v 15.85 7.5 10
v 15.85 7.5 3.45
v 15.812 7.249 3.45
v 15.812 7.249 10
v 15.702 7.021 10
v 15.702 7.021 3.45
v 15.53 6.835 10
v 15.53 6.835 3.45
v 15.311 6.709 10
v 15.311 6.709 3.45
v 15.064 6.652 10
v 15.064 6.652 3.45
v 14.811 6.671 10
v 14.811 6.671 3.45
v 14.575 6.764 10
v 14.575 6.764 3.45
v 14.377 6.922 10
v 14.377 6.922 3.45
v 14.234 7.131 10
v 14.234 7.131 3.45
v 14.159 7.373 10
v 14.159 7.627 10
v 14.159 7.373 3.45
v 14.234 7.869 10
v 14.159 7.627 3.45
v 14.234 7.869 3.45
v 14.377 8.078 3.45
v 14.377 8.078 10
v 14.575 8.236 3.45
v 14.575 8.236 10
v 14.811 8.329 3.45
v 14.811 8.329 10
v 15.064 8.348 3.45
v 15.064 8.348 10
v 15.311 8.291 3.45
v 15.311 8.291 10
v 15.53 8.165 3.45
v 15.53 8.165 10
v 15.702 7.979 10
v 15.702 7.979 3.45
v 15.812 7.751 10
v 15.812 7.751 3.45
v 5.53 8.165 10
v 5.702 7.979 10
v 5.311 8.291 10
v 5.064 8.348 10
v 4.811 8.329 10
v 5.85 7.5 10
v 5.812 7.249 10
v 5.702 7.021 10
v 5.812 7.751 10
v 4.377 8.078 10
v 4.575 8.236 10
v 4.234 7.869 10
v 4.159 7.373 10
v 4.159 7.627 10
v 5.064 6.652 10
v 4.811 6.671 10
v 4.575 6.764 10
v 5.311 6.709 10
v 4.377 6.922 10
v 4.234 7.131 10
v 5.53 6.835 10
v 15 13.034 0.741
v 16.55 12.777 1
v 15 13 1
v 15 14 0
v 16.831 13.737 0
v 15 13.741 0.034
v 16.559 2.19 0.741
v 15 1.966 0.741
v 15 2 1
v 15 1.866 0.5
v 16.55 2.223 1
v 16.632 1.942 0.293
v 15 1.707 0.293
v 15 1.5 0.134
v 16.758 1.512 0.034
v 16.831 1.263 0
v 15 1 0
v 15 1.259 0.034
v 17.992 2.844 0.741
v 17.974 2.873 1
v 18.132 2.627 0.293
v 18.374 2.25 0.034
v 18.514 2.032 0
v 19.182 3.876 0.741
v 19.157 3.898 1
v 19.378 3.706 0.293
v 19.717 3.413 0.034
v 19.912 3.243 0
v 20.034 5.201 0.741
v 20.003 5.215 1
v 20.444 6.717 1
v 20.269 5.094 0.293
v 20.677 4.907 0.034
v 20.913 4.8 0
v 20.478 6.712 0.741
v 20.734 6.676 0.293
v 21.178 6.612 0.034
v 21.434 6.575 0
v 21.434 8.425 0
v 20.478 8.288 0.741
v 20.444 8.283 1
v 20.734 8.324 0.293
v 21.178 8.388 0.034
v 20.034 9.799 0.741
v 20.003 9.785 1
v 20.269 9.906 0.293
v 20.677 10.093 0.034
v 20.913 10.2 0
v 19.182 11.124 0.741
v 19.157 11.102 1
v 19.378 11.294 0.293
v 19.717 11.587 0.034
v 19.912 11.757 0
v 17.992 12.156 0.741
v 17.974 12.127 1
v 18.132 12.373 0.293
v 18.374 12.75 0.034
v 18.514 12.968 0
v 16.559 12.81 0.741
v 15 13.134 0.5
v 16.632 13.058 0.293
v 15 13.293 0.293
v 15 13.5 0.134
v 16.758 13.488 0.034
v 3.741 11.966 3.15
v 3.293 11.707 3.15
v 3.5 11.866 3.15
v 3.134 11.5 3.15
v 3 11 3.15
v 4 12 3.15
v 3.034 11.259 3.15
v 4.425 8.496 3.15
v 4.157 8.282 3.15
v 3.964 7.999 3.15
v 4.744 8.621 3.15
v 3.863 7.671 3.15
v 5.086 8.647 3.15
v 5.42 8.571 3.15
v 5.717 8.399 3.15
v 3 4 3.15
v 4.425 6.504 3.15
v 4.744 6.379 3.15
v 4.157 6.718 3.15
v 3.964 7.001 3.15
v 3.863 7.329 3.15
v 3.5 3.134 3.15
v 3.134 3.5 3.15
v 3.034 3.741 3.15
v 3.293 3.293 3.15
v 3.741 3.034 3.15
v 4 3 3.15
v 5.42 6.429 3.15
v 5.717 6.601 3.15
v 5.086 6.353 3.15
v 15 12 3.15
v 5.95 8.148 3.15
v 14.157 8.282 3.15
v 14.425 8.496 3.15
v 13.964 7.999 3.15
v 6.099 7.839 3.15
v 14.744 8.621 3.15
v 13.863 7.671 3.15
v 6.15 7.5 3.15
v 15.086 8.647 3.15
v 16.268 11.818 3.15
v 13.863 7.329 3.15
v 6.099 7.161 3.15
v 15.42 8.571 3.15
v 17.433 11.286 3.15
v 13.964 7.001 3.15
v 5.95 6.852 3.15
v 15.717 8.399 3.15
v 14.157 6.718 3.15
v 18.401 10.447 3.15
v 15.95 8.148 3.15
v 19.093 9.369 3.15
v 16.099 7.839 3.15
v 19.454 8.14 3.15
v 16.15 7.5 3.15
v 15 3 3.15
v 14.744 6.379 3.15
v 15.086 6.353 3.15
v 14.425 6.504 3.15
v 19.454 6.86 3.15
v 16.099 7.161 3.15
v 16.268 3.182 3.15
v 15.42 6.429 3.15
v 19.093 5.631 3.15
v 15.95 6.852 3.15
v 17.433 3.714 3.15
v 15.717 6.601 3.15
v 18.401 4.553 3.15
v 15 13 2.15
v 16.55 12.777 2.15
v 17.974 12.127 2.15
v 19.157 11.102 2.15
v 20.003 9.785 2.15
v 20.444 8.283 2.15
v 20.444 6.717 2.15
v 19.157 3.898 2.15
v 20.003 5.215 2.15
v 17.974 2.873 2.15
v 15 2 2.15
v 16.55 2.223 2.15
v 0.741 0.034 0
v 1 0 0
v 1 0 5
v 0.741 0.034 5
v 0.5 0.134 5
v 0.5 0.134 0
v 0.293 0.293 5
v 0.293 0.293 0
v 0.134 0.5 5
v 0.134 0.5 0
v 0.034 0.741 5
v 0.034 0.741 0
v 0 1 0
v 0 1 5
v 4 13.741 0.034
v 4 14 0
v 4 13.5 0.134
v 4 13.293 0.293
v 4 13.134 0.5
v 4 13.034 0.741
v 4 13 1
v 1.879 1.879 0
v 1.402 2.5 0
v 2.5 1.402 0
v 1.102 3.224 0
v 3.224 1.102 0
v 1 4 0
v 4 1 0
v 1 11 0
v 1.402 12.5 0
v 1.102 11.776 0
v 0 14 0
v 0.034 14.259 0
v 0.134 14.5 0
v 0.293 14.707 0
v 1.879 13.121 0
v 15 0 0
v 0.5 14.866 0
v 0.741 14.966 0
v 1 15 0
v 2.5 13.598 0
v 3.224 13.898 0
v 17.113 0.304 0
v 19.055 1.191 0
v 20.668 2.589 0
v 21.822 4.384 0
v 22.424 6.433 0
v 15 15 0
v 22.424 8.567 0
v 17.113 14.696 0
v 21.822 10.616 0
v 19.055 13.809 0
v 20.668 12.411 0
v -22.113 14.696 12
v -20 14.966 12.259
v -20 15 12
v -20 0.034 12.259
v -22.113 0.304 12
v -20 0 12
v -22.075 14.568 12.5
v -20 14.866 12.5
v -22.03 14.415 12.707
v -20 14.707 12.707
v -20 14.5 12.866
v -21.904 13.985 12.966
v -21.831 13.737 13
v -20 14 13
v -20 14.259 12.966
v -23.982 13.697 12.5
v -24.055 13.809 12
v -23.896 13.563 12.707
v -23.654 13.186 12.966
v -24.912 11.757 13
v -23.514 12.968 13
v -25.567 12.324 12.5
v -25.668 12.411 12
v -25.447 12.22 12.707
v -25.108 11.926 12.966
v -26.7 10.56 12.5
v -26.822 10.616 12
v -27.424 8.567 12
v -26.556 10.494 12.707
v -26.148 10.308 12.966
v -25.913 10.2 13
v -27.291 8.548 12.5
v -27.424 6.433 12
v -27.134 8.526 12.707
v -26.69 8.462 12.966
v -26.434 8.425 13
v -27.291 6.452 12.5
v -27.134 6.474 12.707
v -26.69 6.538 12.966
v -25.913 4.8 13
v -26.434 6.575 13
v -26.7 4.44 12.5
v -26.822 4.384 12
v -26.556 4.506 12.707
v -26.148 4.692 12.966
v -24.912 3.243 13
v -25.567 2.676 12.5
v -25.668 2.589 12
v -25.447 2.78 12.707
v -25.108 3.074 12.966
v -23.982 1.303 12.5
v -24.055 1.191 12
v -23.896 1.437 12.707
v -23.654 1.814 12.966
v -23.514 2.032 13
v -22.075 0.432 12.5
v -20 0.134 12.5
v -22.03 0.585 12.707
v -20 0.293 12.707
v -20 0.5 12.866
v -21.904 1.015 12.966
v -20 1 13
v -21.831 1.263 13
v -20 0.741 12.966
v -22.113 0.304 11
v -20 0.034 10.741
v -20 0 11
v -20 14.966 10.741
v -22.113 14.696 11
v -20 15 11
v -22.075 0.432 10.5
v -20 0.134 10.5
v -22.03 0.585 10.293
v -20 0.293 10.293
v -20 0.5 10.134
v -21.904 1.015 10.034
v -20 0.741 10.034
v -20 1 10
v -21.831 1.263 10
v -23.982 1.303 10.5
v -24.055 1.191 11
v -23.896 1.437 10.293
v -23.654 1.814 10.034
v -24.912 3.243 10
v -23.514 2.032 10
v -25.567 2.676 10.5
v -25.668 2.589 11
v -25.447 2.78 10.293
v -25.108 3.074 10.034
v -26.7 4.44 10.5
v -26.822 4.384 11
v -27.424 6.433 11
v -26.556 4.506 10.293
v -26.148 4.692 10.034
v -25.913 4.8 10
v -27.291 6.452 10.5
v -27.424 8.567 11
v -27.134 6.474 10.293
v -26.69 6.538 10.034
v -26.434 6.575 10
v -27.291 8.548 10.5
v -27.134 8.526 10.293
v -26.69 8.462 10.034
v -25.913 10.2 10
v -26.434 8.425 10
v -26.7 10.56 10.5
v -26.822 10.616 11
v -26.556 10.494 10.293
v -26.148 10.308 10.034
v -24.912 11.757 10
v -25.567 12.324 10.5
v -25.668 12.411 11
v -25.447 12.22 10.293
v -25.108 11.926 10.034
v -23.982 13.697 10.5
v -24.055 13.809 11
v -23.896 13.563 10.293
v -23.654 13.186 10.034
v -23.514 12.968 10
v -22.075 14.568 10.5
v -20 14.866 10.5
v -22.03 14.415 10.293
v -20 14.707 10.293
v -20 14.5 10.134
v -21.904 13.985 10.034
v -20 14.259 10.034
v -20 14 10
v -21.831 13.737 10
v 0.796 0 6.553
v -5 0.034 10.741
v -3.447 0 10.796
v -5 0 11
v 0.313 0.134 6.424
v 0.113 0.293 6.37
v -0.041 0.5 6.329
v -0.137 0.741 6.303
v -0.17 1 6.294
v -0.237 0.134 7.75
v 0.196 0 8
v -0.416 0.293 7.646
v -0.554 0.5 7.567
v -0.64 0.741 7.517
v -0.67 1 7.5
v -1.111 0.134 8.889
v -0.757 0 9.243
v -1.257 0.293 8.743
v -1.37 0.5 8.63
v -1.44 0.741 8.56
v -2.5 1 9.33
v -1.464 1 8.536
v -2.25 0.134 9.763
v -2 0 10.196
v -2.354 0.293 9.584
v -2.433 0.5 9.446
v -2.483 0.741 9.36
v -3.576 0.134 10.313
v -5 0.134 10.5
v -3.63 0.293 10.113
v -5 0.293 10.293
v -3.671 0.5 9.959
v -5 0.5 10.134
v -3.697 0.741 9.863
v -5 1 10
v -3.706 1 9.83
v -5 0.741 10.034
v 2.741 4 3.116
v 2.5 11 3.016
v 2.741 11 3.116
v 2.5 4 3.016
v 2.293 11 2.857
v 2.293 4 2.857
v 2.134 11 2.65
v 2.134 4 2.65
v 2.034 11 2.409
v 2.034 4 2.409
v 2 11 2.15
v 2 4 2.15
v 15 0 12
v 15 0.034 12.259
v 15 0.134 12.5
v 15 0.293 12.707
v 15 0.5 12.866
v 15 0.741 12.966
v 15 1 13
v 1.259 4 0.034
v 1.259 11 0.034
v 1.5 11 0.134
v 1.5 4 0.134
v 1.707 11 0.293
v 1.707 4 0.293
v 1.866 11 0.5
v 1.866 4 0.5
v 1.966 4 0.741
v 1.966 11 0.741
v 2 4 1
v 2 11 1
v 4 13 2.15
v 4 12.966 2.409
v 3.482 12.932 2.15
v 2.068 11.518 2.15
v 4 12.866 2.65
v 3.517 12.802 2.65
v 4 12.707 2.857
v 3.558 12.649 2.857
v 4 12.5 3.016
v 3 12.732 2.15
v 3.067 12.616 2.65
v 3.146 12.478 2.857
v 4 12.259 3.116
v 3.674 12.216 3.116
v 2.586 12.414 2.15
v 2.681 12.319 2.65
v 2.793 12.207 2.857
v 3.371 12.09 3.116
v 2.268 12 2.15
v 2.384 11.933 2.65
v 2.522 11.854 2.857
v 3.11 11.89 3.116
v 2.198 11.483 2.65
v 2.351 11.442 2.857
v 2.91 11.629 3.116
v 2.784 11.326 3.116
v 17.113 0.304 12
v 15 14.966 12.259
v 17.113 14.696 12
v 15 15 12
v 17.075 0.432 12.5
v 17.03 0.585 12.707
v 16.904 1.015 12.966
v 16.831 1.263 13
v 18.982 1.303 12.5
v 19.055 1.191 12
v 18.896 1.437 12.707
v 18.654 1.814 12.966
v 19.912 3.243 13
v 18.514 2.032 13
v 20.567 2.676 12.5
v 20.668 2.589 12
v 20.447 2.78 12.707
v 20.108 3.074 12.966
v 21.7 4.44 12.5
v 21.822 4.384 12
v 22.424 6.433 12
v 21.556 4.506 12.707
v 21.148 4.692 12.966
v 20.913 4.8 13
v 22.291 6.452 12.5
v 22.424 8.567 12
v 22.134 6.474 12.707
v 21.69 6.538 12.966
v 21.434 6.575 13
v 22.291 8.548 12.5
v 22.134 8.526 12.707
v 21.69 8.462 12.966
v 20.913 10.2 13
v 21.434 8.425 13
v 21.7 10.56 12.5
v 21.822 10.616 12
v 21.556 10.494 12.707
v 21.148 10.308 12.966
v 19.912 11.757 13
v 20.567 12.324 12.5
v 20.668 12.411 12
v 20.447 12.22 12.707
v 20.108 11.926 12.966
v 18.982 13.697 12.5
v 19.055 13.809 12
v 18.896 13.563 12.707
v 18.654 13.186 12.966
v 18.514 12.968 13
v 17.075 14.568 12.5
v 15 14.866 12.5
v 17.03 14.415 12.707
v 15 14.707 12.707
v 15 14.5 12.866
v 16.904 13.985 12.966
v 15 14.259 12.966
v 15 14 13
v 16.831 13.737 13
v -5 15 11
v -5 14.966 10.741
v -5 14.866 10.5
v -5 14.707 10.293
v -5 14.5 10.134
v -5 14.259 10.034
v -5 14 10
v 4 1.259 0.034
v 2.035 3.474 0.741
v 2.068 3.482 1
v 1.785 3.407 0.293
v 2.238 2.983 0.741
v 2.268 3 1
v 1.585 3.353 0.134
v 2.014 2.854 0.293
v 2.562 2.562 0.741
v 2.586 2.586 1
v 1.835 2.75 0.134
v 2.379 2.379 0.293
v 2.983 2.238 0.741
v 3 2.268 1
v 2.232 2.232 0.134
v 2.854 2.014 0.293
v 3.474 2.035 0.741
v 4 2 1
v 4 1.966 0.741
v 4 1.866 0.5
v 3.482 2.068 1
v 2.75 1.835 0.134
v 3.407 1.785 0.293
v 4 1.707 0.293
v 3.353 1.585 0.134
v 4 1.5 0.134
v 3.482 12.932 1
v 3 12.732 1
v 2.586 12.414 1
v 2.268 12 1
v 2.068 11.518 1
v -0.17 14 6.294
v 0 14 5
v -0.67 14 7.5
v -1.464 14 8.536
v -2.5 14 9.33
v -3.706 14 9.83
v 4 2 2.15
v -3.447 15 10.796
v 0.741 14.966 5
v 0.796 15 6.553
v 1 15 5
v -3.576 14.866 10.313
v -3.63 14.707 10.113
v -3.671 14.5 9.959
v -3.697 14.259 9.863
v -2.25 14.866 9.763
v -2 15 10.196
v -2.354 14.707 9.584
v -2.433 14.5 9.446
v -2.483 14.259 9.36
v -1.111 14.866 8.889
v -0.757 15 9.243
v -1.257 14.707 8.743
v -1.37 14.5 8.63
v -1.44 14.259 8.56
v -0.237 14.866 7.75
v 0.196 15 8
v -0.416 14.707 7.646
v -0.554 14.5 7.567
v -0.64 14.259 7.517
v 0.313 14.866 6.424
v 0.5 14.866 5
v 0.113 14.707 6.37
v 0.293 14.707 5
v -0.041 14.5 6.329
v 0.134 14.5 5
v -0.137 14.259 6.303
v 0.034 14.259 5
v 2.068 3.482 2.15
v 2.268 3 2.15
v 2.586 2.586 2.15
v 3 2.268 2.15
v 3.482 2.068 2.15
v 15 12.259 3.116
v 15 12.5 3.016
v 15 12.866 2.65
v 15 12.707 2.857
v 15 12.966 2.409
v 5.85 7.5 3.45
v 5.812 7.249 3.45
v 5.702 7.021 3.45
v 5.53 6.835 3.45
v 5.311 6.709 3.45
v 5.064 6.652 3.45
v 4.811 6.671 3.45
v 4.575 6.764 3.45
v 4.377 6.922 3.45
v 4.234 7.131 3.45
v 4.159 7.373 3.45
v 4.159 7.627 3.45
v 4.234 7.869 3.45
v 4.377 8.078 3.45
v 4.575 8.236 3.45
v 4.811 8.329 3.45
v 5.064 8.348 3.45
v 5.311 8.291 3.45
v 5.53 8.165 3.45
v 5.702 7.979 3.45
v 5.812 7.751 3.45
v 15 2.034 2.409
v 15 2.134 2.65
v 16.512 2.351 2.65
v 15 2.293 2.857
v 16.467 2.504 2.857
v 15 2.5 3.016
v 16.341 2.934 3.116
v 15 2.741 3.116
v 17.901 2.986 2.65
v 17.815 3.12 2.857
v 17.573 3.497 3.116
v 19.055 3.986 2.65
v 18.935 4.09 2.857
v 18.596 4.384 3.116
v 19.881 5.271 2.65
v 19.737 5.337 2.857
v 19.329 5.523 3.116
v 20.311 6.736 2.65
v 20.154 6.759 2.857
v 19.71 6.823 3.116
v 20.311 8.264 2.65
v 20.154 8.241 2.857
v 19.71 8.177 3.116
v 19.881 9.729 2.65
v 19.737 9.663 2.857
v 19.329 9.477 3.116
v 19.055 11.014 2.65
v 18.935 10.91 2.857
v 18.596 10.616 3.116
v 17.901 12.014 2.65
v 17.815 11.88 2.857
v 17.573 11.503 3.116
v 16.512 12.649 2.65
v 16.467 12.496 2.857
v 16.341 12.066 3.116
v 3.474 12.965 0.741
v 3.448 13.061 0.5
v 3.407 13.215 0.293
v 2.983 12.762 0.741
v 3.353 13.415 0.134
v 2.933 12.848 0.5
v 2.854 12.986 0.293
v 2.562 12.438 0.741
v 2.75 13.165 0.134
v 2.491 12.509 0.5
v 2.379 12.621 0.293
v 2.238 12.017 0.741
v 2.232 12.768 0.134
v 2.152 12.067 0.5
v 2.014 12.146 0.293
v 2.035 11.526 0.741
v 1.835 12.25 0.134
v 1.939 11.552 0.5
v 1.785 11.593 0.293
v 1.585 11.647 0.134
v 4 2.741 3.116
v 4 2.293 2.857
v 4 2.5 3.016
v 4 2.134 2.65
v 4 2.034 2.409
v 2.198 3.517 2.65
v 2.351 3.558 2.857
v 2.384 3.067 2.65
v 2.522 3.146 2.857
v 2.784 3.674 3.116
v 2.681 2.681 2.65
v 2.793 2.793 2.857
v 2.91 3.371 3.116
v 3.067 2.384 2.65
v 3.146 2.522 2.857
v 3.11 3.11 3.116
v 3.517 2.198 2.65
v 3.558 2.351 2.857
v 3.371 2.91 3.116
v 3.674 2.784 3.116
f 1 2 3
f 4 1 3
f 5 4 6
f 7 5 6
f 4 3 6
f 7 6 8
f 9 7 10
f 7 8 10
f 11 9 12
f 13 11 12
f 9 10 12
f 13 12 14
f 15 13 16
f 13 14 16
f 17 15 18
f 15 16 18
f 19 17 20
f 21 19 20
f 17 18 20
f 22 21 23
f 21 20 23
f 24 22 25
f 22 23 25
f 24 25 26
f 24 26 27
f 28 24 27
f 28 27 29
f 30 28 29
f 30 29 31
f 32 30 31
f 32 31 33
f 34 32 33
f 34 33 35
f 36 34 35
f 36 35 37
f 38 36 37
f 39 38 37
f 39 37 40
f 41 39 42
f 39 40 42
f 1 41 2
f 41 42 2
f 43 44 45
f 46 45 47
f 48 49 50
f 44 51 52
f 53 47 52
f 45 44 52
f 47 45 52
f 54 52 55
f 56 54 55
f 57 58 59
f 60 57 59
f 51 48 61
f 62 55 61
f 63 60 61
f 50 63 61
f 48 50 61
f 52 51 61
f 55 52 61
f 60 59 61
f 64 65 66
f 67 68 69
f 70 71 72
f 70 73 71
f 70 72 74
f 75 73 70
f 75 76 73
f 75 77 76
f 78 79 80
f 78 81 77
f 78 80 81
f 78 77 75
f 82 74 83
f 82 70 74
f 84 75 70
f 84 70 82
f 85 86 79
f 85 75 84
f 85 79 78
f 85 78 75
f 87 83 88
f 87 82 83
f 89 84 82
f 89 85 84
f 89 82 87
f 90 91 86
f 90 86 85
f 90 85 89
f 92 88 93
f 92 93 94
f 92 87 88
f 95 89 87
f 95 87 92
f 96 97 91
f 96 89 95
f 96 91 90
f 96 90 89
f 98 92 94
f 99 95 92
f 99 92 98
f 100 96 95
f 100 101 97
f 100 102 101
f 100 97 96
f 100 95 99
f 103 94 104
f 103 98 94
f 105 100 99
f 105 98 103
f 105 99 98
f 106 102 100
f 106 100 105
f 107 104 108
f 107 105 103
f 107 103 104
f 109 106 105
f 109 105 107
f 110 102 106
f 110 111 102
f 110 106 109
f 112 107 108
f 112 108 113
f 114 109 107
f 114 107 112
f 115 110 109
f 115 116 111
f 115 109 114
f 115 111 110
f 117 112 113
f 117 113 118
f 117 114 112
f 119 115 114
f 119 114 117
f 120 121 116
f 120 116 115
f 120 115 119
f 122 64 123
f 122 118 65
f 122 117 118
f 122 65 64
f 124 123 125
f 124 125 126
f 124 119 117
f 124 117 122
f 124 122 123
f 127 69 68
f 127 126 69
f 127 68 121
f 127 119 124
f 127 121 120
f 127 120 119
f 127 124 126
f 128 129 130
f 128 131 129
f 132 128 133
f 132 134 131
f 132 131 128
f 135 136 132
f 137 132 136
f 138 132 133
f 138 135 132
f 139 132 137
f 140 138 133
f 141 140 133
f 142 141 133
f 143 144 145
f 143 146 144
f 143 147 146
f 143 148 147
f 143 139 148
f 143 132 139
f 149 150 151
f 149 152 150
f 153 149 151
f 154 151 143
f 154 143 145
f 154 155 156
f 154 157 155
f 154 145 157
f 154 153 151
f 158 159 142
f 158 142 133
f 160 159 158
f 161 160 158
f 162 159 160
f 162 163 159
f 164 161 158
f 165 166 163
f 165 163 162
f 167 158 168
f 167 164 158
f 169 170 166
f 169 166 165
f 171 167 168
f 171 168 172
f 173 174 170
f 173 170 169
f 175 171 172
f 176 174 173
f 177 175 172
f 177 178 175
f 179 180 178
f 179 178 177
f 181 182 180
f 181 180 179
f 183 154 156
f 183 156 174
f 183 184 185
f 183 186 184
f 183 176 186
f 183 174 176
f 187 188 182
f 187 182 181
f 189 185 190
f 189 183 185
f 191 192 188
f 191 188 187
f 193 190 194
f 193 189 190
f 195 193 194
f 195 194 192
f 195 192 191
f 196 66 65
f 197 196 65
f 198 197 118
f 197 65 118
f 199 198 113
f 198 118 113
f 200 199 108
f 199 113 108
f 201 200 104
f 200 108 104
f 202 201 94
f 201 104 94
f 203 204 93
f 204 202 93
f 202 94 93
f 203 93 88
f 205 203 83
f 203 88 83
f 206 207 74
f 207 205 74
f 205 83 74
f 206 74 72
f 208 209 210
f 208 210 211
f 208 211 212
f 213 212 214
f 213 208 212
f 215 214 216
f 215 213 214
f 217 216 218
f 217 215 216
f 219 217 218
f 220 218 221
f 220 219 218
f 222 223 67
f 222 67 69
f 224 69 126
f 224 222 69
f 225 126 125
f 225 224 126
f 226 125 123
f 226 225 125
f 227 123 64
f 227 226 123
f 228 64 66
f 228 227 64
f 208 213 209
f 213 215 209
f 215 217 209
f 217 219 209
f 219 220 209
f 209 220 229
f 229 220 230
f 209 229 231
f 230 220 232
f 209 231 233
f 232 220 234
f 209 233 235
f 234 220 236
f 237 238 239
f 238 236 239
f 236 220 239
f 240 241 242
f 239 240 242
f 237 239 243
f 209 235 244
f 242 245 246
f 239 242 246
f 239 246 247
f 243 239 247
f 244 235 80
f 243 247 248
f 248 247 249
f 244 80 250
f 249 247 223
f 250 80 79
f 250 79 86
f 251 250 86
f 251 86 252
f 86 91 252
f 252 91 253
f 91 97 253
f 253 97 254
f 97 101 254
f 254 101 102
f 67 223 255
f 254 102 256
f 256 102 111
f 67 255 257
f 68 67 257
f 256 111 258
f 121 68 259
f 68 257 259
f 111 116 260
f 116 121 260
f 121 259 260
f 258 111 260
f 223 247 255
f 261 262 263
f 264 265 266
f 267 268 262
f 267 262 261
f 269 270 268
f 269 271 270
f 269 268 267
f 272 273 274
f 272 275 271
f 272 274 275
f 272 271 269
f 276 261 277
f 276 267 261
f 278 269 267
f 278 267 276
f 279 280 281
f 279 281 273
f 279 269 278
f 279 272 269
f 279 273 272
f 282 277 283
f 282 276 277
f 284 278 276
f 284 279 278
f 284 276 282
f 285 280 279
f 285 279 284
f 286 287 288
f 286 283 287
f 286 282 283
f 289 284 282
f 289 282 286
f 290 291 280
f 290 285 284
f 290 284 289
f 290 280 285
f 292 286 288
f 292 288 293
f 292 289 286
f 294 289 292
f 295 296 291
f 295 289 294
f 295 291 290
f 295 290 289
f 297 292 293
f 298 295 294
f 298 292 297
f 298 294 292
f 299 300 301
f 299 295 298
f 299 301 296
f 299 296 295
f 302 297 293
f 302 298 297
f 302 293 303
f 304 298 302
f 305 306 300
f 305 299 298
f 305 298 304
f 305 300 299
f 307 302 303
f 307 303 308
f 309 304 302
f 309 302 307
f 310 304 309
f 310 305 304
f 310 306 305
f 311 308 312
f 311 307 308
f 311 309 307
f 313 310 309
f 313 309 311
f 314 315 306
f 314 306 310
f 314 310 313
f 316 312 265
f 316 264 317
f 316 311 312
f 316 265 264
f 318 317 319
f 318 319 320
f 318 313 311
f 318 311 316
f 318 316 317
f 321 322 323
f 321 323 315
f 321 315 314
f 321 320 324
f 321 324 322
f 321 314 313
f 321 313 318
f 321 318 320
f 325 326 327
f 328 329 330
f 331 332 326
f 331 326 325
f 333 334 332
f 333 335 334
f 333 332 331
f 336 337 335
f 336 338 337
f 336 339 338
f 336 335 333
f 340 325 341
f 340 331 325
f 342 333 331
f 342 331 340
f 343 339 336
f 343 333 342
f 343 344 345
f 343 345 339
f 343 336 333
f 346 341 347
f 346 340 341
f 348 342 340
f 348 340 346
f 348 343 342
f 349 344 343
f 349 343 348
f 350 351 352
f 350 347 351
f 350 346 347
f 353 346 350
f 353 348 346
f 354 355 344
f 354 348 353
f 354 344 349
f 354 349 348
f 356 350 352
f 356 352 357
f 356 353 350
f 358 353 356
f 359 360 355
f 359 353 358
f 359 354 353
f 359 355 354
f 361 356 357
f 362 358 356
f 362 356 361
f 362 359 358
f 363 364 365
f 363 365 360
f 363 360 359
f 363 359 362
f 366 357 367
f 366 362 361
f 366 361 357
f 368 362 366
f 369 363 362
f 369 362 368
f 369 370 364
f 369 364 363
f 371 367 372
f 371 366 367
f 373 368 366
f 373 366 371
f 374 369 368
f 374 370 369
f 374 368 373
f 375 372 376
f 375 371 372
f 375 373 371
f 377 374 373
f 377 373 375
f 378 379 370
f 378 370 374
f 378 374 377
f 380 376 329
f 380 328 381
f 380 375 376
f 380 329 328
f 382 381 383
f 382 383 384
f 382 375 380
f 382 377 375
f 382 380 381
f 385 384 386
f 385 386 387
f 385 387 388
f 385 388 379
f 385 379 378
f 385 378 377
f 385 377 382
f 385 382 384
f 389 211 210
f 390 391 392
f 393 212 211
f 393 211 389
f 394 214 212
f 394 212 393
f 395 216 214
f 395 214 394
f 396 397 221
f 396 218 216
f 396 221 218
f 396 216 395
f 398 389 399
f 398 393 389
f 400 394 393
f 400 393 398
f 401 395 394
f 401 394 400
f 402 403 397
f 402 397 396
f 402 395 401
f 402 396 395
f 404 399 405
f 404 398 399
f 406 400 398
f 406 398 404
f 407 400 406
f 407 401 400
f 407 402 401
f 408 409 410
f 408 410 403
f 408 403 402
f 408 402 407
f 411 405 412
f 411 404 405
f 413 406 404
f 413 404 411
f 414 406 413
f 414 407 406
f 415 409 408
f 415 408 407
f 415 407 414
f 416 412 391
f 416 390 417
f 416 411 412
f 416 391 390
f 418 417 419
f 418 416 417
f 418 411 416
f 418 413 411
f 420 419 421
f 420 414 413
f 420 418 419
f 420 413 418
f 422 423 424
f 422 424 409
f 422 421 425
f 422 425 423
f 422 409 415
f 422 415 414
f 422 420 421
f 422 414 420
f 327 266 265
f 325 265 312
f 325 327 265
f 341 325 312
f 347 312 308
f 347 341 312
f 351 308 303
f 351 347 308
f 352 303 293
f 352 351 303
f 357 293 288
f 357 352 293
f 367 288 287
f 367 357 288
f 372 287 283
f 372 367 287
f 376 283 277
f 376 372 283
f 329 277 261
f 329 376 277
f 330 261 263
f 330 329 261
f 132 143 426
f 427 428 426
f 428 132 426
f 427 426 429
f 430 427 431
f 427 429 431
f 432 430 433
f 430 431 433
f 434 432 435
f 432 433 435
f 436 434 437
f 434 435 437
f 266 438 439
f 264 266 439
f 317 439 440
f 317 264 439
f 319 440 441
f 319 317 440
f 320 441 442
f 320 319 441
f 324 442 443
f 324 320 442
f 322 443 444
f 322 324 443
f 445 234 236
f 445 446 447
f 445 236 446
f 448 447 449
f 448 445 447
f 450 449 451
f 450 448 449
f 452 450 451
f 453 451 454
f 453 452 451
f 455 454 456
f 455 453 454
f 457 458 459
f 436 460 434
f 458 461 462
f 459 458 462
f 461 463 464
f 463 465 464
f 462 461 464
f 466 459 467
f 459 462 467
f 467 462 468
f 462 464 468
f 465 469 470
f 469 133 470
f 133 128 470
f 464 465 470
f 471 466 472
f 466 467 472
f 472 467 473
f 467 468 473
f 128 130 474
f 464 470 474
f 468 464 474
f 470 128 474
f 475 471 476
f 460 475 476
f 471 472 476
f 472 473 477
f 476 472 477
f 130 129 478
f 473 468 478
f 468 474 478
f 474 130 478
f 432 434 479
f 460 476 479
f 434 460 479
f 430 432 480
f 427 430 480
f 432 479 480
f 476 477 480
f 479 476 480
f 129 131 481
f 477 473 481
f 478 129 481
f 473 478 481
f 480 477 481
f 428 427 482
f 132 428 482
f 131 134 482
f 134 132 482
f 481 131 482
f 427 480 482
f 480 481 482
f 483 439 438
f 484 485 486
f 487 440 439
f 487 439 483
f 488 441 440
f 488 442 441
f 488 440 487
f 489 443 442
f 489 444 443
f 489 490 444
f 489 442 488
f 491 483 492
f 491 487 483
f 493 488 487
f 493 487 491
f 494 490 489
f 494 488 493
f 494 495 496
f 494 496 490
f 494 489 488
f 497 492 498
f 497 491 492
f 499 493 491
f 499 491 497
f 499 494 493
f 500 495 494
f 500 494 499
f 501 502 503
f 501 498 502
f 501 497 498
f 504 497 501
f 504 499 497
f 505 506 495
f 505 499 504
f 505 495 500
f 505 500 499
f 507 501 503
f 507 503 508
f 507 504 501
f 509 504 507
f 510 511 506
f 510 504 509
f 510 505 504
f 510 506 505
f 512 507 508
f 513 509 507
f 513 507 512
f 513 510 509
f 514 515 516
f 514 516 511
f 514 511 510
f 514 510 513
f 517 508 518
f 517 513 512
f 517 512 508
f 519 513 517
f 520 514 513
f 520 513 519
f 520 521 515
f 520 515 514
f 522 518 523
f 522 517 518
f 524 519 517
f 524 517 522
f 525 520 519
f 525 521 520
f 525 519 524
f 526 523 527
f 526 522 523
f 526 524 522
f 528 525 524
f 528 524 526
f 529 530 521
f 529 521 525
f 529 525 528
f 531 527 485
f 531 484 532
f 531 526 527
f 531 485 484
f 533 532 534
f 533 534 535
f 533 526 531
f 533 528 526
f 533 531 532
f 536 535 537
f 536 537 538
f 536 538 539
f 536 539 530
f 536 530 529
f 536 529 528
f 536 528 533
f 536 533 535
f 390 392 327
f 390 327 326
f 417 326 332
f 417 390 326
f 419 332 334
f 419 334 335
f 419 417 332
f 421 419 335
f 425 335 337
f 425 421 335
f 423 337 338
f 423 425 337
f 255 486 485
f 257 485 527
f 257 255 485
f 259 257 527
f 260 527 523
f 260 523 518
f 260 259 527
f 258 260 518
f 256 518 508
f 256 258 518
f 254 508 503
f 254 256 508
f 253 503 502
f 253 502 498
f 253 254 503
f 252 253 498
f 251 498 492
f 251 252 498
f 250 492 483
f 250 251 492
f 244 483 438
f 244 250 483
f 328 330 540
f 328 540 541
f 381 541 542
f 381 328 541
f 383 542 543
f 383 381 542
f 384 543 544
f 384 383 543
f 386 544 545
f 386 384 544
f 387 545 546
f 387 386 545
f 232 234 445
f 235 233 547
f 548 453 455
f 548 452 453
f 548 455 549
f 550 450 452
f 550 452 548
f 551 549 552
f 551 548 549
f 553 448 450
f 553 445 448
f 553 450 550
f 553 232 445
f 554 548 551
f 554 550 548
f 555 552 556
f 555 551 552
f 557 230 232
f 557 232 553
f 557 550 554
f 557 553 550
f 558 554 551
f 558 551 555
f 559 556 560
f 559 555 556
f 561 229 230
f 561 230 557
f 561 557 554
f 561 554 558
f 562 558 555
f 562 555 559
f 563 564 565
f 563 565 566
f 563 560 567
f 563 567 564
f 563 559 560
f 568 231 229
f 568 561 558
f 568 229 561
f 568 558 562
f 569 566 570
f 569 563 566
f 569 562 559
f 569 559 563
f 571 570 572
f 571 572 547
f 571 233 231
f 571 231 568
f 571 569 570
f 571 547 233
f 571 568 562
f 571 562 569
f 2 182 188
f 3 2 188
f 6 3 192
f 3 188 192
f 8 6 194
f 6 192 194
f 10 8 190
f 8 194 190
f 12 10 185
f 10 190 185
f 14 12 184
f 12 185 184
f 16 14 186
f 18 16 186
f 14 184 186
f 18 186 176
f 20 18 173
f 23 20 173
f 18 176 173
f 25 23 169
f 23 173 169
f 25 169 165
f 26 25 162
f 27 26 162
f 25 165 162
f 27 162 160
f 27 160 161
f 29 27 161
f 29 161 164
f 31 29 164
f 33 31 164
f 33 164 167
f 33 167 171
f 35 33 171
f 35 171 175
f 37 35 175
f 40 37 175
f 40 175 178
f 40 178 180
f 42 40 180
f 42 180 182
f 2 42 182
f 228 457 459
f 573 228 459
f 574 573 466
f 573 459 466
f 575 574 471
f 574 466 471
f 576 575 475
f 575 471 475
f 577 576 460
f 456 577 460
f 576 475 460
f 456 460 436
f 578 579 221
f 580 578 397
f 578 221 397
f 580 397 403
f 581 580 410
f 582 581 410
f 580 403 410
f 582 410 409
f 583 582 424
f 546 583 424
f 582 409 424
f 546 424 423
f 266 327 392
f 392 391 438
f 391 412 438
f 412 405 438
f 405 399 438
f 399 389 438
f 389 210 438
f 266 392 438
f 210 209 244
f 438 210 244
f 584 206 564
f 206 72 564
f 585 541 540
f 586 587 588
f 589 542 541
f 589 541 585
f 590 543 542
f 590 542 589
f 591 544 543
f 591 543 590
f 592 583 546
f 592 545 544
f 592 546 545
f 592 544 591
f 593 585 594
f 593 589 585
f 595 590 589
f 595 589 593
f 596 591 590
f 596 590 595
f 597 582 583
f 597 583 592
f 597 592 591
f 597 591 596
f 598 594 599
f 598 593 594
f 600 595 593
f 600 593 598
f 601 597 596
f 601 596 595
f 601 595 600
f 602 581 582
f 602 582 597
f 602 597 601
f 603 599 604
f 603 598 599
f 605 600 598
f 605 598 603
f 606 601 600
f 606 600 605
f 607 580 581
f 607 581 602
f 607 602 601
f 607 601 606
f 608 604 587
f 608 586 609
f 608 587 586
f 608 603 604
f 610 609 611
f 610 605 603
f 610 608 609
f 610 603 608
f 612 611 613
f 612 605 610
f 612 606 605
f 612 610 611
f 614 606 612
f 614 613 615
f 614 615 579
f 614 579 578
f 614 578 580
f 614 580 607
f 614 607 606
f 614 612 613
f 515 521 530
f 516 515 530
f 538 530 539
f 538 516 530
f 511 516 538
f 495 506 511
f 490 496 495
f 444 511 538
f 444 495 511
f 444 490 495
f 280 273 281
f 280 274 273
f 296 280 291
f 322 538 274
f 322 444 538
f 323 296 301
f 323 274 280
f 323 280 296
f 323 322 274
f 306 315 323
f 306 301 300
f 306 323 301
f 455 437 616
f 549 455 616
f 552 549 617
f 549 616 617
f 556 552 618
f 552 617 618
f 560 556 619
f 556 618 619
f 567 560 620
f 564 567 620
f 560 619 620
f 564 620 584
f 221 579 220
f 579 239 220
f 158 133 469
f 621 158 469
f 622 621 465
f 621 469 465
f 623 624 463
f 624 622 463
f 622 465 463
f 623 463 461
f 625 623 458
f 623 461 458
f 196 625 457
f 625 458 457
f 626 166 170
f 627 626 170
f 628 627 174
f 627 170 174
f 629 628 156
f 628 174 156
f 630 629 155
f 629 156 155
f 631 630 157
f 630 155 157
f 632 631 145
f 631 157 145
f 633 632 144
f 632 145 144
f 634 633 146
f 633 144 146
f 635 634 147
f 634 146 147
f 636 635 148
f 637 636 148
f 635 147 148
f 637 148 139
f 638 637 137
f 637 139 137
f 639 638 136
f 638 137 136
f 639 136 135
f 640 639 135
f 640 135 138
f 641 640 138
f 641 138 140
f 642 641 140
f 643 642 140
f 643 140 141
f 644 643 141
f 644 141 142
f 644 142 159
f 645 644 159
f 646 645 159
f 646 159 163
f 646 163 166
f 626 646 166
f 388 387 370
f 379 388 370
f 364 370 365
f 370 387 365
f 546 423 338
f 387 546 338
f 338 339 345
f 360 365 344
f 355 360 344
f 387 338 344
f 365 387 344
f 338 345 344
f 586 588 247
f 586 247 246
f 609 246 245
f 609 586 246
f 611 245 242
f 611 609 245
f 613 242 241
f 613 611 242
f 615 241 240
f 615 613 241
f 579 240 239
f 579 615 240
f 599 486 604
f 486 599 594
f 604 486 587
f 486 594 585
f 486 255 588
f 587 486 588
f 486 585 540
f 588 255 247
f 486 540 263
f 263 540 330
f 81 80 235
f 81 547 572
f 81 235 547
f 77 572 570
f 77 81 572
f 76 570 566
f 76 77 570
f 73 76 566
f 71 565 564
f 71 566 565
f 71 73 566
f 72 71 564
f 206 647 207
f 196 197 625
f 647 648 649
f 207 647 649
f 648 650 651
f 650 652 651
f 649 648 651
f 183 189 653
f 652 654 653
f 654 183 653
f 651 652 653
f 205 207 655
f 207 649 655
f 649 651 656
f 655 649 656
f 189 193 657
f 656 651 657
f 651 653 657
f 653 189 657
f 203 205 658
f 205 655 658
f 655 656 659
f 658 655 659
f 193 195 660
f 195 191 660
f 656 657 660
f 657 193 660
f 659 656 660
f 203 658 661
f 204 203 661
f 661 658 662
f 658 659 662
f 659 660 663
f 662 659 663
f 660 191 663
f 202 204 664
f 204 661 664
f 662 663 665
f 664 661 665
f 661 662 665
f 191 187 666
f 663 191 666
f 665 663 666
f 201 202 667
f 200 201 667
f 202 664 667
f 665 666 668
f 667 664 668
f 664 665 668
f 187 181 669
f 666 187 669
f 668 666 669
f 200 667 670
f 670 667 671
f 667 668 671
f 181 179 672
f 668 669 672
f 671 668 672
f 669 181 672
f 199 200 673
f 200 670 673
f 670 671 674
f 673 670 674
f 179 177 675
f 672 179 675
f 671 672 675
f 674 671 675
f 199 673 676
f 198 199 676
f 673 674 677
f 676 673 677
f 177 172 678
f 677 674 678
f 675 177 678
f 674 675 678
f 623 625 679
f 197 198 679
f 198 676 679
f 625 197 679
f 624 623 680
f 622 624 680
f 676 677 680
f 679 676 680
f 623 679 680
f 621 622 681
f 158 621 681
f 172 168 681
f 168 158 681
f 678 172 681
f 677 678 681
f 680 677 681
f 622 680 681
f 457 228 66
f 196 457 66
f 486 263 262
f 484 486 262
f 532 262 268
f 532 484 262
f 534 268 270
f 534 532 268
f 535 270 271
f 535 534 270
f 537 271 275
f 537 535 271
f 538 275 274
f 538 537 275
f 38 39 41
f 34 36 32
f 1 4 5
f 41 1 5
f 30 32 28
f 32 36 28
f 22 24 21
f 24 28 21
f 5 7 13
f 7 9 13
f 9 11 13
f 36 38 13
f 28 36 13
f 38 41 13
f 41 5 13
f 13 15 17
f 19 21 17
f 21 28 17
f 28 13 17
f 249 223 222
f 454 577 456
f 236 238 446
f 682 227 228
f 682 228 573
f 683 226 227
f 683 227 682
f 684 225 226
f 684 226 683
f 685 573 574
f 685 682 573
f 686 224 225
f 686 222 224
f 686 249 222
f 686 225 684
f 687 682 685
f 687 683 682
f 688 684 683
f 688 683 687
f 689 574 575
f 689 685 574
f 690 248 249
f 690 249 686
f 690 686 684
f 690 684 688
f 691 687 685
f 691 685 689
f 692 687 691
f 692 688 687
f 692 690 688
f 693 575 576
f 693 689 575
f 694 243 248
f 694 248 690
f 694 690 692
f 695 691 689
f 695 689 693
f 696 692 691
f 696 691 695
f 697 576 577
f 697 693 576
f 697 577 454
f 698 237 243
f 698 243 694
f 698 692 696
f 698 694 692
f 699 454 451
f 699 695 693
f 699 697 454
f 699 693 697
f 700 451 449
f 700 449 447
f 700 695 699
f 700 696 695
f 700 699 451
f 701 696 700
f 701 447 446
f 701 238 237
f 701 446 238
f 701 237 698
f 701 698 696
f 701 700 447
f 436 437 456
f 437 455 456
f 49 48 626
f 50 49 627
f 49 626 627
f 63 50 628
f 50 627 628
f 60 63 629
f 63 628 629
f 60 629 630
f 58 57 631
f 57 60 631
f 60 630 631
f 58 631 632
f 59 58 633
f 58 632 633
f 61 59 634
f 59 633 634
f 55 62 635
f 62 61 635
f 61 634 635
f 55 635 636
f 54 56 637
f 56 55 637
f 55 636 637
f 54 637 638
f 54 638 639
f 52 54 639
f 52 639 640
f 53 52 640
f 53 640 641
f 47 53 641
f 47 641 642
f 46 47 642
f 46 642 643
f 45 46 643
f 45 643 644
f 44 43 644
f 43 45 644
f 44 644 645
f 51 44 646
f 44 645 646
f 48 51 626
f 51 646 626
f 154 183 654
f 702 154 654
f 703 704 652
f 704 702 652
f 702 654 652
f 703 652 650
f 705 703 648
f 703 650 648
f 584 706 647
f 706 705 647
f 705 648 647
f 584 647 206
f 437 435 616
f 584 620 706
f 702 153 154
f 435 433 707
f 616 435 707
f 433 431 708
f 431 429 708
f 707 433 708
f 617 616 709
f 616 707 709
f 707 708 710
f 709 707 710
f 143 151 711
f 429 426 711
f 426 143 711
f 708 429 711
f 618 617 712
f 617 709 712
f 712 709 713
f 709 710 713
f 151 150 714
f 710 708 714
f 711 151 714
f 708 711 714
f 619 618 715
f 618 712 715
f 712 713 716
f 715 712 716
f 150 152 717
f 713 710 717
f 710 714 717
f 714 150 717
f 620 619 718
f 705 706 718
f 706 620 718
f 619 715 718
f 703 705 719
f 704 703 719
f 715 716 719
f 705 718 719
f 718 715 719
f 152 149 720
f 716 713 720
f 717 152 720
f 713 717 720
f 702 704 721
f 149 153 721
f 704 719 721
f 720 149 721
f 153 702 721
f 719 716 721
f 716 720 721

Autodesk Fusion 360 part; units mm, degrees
sketch "Sketch1" plane through (0, 0, 0) normal (0, 0, 1) x (1, 0, 0)
  line L0 (0, 0) -> (15, 0)
  line L1 (15, 0) -> (15, 15)
  line L2 (15, 15) -> (0, 15)
  line L3 (0, 15) -> (0, 0)
  circle A0 centre (15, 7.5) radius 7.5
  circle A1 centre (15, 7.5) radius 0.85
  circle A2 centre (5, 7.5) radius 0.85
  dimension "d1" = 15
  dimension "d2" = 15
  dimension "d3" = 1.7
  dimension "d4" = 10
  dimension "d5" = 7.5
  dimension "d6" = 1.7
extrude "Extrude1" add sketch "Sketch1" along normal blind 10 contours L0 L2 L3 A0 | L1 A0 A1 | L1 A0 A1
sketch "Sketch2" plane through (0, 0, 10) normal (0, 0, 1) x (-1, 0, 0)
  circle A0 centre (-5, -7.5) radius 0.85
  circle A1 centre (-15, -7.5) radius 0.85
  arc A2 (-15, 0) -> (-15, -15) centre (-15, -7.5) ccw
  line L0 (-15, -15) -> (0, -15)
  line L1 (0, -15) -> (0, 0)
  line L2 (0, 0) -> (-15, 0)
  line L3 (0, -15) -> (-15, -15)
  arc A3 (-15, 0) -> (-15, -15) centre (-15, -7.5) ccw
  line L4 (0, 0) -> (-15, 0)
  line L5 (0, -15) -> (0, 0)
  line L6 (0, 0) -> (20, 0)
  line L7 (20, 0) -> (20, -15)
  line L8 (20, -15) -> (0, -15)
  line L9 (0, -15) -> (0, 0)
  arc A4 (20, -15) -> (20, 0) centre (20, -7.5) ccw
  dimension "d9" = 20
  dimension "d10" = 15
extrude "Extrude2" add sketch "Sketch2" along normal blind 3 contours A0 | A1 | A2 L0 L1 L2 L3 A3 L4 L5 L9 | L1 L5 L6 L7 L8 L9 | L7 A4
fillet "Fillet1" radius 1 1 faces at (-1.6667, 5, 13)
fillet "Fillet2" radius 5 1 edges at (0, 7.5, 10)
fillet "Fillet3" radius 1 7 edges at (0, 15, 2.5) (-1.4645, 15, 8.5355) (-12.5, 15, 10) (-27.5, 7.5, 10) (-12.5, 0, 10) (-1.4645, 0, 8.5355) (0, 0, 2.5)
sketch "Sketch3" plane through (0, 0, 0) normal (0, 0, -1) x (1, 0, 0)
  arc A0 (1, 0) -> (0, -1) centre (1, -1) ccw
  line L0 (0, -1) -> (0, -14)
  arc A1 (0, -14) -> (1, -15) centre (1, -14) ccw
  line L1 (1, -15) -> (15, -15)
  arc A2 (15, -15) -> (15, 0) centre (15, -7.5) ccw
  line L2 (15, 0) -> (1, 0)
  line L3 (2, -2) -> (2, -13)
  line L4 (2, -13) -> (15, -13)
  arc A3 (15, -13) -> (15, -2) centre (15, -7.5) ccw
  line L5 (15, -2) -> (2, -2)
  circle A4 centre (5, -7.5) radius 0.85
  circle A5 centre (15, -7.5) radius 0.85
  dimension "d21" = -2
extrude "Extrude3" cut sketch "Sketch3" along normal blind 0 and the other way blind 3.15 contours L3 L4 A3 L5
fillet "Fillet4" radius 2 2 edges at (2, 13, 1.575) (2, 2, 1.575)
fillet "Fillet5" radius 1 6 edges at (2.5858, 12.4142, 3.15) (2, 7.5, 3.15) (2.5858, 2.5858, 3.15) (9.5, 2, 3.15) (20.5, 7.5, 3.15) (9.5, 13, 3.15)
fillet "Fillet6" radius 1 6 edges at (2.5858, 12.4142, 0) (2, 7.5, 0) (2.5858, 2.5858, 0) (9.5, 2, 0) (20.5, 7.5, 0) (9.5, 13, 0)
chamfer "Chamfer2" distance 0.3 angle 45 2 edges at (14.2075, 7.8074, 3.15) (4.2075, 7.8074, 3.15)
